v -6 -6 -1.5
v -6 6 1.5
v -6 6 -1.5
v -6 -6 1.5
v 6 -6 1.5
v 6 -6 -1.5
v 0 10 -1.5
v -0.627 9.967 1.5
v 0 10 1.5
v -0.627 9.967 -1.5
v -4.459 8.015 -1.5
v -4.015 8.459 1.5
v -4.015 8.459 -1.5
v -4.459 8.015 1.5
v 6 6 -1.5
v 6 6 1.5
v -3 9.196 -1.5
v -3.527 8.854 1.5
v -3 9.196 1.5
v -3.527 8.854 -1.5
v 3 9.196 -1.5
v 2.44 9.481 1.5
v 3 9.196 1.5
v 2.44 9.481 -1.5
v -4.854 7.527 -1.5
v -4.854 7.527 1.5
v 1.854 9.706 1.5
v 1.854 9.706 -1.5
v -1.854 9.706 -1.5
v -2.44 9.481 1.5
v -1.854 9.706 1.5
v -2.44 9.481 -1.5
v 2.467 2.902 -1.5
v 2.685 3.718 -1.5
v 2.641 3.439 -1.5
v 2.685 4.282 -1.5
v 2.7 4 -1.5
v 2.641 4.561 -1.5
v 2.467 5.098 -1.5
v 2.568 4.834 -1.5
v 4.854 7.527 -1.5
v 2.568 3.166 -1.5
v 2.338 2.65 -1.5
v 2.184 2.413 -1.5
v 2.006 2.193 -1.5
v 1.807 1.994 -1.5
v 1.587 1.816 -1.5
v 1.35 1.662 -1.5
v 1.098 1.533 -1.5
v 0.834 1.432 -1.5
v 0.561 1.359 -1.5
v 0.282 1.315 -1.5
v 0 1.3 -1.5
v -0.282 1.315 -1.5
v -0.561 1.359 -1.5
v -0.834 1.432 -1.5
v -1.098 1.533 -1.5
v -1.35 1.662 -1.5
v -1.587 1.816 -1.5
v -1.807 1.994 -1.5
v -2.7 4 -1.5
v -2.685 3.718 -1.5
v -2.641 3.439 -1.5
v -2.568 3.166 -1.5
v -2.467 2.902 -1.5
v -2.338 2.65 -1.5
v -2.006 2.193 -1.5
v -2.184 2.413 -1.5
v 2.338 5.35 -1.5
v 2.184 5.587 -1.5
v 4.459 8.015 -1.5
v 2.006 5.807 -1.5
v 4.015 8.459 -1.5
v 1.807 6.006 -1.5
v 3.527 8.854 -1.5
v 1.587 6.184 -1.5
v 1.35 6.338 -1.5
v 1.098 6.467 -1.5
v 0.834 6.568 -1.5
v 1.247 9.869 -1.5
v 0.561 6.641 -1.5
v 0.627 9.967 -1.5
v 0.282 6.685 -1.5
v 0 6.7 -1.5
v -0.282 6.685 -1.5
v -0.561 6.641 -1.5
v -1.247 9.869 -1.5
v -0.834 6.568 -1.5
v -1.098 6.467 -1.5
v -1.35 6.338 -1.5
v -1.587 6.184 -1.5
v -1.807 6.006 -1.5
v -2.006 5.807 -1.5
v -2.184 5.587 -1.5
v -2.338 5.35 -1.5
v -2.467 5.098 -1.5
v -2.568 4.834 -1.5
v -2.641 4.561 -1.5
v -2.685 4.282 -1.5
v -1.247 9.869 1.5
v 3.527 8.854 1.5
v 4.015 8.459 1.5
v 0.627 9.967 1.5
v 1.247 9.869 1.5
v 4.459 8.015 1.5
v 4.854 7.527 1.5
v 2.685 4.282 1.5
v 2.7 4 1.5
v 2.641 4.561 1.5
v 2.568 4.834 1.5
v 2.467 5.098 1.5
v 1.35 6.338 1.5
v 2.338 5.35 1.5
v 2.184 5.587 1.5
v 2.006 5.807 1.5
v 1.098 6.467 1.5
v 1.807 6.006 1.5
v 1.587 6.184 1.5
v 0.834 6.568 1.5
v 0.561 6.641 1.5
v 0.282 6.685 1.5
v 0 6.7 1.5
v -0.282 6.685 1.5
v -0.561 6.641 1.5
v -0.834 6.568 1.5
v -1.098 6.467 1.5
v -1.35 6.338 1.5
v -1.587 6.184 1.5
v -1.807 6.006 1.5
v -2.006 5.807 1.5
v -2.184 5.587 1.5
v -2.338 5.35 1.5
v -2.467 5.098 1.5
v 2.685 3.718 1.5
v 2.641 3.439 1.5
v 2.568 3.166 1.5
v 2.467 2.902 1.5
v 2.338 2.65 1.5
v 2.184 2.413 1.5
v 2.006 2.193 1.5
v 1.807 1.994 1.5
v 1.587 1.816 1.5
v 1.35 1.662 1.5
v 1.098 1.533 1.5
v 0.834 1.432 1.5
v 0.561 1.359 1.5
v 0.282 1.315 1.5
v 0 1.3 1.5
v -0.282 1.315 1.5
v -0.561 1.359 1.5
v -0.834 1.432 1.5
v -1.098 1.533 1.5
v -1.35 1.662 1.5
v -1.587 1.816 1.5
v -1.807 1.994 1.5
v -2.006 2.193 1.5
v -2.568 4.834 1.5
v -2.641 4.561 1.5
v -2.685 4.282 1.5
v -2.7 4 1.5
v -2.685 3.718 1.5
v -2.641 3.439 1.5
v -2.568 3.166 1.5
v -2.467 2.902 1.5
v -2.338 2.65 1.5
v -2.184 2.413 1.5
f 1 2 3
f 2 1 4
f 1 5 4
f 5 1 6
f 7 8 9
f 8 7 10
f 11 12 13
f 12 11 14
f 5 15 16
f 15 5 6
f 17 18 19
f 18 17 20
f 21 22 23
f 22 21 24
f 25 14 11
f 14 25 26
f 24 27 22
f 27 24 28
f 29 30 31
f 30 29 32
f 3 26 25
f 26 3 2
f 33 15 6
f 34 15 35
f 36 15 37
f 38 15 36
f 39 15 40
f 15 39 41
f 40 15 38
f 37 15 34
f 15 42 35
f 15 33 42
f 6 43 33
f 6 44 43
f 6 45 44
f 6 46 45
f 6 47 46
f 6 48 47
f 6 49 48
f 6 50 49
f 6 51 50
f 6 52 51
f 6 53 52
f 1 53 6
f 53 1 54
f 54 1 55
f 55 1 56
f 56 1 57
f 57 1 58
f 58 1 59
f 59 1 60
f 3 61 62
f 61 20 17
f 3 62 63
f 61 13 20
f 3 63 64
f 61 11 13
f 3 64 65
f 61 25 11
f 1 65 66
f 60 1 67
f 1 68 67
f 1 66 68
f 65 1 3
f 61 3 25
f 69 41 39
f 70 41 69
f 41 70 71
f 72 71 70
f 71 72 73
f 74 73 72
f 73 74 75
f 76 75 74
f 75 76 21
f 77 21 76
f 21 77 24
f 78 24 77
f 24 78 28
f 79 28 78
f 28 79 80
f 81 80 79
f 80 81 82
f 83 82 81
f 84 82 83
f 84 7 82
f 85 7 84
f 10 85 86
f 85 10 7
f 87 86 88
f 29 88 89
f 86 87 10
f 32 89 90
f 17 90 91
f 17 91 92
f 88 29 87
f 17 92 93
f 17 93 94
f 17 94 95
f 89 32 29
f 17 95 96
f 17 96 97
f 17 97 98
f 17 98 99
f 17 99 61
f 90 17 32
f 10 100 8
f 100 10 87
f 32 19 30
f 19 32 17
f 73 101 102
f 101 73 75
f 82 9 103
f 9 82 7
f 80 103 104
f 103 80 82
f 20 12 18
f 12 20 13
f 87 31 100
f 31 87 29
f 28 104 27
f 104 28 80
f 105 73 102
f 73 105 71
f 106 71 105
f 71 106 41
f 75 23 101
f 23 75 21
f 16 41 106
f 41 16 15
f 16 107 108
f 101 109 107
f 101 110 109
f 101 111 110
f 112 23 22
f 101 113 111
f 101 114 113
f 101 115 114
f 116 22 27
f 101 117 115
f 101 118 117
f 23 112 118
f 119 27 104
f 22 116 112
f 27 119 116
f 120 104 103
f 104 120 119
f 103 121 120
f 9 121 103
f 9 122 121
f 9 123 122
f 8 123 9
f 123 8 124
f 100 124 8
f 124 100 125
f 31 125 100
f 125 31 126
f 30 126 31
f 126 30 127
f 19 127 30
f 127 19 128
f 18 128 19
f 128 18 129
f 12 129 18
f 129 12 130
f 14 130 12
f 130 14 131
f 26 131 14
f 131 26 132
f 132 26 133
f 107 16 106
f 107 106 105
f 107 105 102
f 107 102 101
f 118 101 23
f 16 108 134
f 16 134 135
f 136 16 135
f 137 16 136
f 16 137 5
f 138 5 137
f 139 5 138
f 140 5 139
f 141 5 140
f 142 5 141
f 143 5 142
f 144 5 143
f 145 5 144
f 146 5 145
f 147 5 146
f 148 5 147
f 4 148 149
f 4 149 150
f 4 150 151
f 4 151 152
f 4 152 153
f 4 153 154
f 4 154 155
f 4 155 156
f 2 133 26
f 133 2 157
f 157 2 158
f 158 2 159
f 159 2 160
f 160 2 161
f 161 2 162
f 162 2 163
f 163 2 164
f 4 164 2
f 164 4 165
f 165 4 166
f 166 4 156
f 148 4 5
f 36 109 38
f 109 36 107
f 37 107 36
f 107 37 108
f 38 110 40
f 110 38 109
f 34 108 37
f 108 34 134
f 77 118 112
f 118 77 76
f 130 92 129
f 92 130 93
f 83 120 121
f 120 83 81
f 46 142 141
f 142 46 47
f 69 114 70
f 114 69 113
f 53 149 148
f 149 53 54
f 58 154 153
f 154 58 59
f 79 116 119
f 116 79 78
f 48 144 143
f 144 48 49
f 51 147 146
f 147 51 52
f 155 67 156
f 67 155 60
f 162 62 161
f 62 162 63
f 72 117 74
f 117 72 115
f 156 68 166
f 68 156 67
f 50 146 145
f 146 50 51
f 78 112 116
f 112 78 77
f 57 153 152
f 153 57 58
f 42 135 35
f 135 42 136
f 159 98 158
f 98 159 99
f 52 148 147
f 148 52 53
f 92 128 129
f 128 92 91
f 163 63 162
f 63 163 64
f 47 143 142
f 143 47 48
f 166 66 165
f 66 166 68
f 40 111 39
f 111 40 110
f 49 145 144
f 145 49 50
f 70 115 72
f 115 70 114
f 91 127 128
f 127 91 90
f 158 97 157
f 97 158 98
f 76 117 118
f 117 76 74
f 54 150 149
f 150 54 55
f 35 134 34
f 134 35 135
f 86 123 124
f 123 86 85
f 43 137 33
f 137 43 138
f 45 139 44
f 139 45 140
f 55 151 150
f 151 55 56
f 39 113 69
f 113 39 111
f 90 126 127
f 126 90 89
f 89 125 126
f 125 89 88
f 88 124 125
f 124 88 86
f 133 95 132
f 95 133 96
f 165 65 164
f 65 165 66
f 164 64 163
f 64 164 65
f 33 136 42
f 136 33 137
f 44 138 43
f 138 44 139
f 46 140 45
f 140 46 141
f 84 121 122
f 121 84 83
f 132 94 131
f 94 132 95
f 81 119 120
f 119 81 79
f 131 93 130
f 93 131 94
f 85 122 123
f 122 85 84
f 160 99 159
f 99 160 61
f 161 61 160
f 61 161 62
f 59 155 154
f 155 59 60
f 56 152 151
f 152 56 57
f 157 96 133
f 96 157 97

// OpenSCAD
// Single-hole mounting tab.
$fn = 60;
eps = 0.02;
tab_w = 12;
tab_h = 20;
tab_t = 3;
hole_d = 5.4;
difference() {
    hull() {
        translate([0, 0, 0]) cube([tab_w, tab_w, tab_t], center = true);
        translate([0, tab_h / 2 - tab_w / 2, 0]) cylinder(d = tab_w, h = tab_t, center = true);
    }
    translate([0, tab_h / 2 - tab_w / 2, -tab_t / 2 - eps]) cylinder(d = hole_d, h = tab_t + 2 * eps);
}
